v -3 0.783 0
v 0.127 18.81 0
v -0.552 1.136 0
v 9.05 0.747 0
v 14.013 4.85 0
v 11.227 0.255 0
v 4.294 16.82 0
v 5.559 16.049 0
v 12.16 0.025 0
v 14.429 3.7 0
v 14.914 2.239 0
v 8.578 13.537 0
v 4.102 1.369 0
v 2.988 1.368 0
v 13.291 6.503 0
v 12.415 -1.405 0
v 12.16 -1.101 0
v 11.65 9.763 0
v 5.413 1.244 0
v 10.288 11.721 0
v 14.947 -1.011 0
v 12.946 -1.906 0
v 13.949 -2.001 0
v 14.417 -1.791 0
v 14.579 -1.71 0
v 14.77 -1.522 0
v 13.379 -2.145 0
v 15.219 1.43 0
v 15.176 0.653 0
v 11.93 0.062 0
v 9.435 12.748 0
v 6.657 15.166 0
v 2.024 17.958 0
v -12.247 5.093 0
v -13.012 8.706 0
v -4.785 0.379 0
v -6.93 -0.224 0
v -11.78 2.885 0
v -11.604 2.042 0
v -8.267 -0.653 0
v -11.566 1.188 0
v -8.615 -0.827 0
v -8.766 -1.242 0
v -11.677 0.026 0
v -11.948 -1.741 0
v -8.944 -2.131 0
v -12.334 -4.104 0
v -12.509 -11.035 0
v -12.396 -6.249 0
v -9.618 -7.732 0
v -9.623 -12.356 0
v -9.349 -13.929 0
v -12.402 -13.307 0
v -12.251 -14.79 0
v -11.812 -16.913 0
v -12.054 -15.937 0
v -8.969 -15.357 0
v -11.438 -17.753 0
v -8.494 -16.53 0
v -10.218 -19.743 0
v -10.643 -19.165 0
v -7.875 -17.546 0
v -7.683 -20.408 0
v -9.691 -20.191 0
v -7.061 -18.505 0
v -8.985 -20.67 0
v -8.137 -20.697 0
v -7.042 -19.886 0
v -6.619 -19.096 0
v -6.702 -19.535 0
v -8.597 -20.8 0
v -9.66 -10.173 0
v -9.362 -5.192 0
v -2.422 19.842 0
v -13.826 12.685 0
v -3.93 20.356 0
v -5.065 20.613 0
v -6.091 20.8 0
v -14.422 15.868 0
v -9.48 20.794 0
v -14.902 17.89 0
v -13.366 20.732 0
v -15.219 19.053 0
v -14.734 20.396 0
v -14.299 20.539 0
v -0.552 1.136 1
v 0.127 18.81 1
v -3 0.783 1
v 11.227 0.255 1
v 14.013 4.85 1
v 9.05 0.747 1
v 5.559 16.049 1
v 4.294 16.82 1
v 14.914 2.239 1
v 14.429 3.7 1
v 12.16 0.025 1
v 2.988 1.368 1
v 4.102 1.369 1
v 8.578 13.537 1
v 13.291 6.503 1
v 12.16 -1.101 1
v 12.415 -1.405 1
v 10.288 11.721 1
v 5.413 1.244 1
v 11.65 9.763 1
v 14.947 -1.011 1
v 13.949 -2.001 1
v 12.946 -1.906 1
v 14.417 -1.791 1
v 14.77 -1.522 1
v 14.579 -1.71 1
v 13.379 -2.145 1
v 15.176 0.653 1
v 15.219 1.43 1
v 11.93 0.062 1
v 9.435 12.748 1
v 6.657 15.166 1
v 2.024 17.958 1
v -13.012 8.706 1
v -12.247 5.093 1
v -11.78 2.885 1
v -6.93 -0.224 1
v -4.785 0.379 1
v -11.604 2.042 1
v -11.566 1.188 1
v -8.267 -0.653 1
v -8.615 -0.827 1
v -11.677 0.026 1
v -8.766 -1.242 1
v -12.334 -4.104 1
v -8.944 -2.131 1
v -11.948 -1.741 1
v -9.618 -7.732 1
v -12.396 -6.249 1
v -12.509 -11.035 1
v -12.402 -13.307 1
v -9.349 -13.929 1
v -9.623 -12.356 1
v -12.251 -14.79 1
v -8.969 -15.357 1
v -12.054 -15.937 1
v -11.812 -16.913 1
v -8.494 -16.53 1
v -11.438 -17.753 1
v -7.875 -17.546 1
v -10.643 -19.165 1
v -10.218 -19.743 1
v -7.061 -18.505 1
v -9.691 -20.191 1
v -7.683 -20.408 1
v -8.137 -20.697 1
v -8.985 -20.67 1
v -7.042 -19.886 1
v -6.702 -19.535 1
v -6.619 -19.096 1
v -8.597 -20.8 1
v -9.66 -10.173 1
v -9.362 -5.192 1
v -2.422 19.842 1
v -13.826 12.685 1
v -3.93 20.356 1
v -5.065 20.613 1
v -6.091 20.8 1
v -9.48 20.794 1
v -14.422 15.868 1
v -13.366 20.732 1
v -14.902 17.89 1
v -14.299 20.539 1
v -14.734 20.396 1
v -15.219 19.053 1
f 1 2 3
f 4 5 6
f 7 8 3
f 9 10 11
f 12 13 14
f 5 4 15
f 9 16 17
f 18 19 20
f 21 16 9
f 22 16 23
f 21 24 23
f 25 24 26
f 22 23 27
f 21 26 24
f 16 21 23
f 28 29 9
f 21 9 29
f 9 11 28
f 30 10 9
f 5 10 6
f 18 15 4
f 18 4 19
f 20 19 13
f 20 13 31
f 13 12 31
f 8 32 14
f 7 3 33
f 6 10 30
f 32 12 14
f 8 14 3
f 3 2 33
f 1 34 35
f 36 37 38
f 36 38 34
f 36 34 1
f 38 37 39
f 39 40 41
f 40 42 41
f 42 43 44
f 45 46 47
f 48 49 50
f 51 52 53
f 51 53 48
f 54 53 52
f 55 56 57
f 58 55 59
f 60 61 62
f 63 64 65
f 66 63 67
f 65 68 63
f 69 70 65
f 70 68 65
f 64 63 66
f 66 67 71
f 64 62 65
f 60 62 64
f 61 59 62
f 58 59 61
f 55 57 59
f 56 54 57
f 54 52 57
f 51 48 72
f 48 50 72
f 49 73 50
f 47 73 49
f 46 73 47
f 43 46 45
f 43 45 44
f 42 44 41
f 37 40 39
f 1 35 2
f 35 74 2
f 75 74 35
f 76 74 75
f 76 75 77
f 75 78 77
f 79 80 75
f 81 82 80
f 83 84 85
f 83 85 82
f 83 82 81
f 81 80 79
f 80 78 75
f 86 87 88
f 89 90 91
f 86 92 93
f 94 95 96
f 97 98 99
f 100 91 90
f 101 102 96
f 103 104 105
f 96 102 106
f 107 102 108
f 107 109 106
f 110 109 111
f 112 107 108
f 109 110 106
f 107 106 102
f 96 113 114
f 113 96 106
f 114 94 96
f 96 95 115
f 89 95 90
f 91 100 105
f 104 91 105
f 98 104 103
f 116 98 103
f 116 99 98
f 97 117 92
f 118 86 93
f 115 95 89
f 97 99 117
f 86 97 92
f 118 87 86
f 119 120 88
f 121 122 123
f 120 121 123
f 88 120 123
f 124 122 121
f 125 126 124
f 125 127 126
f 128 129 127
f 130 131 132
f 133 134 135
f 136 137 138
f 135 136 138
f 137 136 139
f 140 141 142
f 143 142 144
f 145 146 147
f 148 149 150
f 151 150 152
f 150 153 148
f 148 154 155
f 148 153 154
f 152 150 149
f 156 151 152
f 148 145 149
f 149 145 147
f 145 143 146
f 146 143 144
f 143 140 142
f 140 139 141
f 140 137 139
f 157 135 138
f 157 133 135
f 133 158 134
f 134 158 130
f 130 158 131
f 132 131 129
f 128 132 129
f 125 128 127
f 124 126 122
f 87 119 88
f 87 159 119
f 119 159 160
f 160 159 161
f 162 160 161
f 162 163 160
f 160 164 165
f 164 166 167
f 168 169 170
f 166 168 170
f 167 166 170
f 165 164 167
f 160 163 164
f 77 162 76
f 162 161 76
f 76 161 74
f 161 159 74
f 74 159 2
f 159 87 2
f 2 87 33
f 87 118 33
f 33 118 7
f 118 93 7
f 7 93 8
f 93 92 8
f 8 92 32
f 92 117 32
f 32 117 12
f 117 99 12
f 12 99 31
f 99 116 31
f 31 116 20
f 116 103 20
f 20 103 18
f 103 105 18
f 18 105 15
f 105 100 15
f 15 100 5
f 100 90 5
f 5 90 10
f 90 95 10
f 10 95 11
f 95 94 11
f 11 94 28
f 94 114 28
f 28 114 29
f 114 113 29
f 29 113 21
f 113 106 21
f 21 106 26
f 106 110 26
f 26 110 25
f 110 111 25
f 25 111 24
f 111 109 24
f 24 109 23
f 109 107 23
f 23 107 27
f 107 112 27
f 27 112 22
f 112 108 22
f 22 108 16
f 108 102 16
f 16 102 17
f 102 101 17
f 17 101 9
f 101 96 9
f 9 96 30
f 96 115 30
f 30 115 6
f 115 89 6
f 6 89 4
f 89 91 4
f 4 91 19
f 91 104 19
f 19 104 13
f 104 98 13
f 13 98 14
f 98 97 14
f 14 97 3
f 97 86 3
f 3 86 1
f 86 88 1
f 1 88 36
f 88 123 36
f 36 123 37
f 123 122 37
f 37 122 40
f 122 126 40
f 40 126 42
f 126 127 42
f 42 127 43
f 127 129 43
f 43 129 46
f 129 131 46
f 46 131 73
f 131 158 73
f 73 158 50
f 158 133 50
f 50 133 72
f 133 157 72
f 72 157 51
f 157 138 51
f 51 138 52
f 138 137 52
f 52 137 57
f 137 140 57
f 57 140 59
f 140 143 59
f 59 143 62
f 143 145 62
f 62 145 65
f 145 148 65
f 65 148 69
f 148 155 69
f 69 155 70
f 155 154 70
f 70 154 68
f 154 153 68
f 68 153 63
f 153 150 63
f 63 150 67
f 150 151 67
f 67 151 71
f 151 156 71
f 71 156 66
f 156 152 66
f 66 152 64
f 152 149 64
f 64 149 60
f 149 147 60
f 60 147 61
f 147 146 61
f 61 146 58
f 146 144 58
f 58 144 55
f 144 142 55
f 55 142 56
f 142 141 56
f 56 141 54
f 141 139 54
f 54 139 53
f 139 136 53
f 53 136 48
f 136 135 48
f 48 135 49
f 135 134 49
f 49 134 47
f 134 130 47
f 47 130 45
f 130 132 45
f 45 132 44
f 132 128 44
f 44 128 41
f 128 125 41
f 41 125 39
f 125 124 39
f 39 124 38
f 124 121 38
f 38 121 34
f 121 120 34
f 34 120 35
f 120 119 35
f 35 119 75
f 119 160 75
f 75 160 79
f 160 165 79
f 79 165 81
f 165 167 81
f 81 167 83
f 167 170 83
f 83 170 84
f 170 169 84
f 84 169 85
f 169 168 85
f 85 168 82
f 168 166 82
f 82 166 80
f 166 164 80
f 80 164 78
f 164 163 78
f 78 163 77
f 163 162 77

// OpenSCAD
// Module names are of the form poly_<inkscape-path-id>().  As a result,
// you can associate a polygon in this OpenSCAD program with the corresponding
// SVG element in the Inkscape document by looking for the XML element with
// the attribute id="inkscape-path-id".

// fudge value is used to ensure that subtracted solids are a tad taller
// in the z dimension than the polygon being subtracted from.  This helps
// keep the resulting .stl file manifold.
fudge = 0.1;

module parte1(h)
{
  scale([25.4/90, -25.4/90, 1]) union()
  {
    linear_extrude(height=h)
      polygon([[-47.360202,-73.458439],[-50.665171,-72.775412],[-52.207490,-72.268650],[-53.066782,-69.889073],[-53.926073,-67.509495],[-52.802384,-63.389301],[-51.103079,-56.225781],[-48.990653,-44.947575],[-46.104314,-30.846375],[-43.394240,-18.045129],[-41.741755,-10.223370],[-41.115877,-7.234439],[-40.981612,-4.208327],[-41.376143,-0.091575],[-42.336650,6.169275],[-43.702703,14.541862],[-43.923035,22.143291],[-44.322385,39.100534],[-43.945068,47.150887],[-43.410765,52.405788],[-42.711213,56.470899],[-41.851921,59.927346],[-40.529933,62.904572],[-37.709693,67.906091],[-36.205933,69.955172],[-34.338625,71.541557],[-31.837866,73.240862],[-30.460795,73.700803],[-28.833098,73.337257],[-27.221926,72.312716],[-24.952514,70.461934],[-23.748955,69.219816],[-23.454262,67.663727],[-25.018613,65.570580],[-27.902887,62.169216],[-30.097249,58.569555],[-31.779340,54.416310],[-33.126803,49.354200],[-34.099015,43.782574],[-34.228460,36.046192],[-34.079736,27.395437],[-33.170870,18.397659],[-31.691896,7.549099],[-31.060854,4.402150],[-30.526895,2.930406],[-29.293040,2.313478],[-24.555918,0.793192],[-16.954490,-1.344021],[-10.630983,-2.776174],[-1.955440,-4.026554],[10.586917,-4.847288],[14.536354,-4.850042],[19.179835,-4.406625],[32.066459,-2.646729],[39.780807,-0.903358],[42.270550,-0.220331],[43.085776,-0.088133],[43.085776,1.916882],[43.085776,3.899863],[43.989134,4.979486],[45.870212,6.753153],[47.404268,7.601428],[49.425808,7.089158],[51.083800,6.345540],[51.656662,6.059109],[52.334180,5.392263],[52.962124,3.583137],[53.771842,-2.313478],[53.926073,-5.067619],[52.846450,-7.931925],[51.127867,-13.109709],[49.650959,-17.185149],[47.095805,-23.041140],[41.279060,-34.592006],[36.453805,-41.532441],[33.432513,-45.170660],[30.394696,-47.966113],[23.586460,-53.738792],[19.697614,-56.867496],[15.213873,-59.599603],[7.171782,-63.631665],[0.451679,-66.650203],[-8.581902,-70.307702],[-13.924935,-72.128189],[-17.945980,-73.039809],[-21.581446,-73.700803],[-33.589499,-73.678770],[-47.360202,-73.458439]]);
  }
}

parte1(1);
